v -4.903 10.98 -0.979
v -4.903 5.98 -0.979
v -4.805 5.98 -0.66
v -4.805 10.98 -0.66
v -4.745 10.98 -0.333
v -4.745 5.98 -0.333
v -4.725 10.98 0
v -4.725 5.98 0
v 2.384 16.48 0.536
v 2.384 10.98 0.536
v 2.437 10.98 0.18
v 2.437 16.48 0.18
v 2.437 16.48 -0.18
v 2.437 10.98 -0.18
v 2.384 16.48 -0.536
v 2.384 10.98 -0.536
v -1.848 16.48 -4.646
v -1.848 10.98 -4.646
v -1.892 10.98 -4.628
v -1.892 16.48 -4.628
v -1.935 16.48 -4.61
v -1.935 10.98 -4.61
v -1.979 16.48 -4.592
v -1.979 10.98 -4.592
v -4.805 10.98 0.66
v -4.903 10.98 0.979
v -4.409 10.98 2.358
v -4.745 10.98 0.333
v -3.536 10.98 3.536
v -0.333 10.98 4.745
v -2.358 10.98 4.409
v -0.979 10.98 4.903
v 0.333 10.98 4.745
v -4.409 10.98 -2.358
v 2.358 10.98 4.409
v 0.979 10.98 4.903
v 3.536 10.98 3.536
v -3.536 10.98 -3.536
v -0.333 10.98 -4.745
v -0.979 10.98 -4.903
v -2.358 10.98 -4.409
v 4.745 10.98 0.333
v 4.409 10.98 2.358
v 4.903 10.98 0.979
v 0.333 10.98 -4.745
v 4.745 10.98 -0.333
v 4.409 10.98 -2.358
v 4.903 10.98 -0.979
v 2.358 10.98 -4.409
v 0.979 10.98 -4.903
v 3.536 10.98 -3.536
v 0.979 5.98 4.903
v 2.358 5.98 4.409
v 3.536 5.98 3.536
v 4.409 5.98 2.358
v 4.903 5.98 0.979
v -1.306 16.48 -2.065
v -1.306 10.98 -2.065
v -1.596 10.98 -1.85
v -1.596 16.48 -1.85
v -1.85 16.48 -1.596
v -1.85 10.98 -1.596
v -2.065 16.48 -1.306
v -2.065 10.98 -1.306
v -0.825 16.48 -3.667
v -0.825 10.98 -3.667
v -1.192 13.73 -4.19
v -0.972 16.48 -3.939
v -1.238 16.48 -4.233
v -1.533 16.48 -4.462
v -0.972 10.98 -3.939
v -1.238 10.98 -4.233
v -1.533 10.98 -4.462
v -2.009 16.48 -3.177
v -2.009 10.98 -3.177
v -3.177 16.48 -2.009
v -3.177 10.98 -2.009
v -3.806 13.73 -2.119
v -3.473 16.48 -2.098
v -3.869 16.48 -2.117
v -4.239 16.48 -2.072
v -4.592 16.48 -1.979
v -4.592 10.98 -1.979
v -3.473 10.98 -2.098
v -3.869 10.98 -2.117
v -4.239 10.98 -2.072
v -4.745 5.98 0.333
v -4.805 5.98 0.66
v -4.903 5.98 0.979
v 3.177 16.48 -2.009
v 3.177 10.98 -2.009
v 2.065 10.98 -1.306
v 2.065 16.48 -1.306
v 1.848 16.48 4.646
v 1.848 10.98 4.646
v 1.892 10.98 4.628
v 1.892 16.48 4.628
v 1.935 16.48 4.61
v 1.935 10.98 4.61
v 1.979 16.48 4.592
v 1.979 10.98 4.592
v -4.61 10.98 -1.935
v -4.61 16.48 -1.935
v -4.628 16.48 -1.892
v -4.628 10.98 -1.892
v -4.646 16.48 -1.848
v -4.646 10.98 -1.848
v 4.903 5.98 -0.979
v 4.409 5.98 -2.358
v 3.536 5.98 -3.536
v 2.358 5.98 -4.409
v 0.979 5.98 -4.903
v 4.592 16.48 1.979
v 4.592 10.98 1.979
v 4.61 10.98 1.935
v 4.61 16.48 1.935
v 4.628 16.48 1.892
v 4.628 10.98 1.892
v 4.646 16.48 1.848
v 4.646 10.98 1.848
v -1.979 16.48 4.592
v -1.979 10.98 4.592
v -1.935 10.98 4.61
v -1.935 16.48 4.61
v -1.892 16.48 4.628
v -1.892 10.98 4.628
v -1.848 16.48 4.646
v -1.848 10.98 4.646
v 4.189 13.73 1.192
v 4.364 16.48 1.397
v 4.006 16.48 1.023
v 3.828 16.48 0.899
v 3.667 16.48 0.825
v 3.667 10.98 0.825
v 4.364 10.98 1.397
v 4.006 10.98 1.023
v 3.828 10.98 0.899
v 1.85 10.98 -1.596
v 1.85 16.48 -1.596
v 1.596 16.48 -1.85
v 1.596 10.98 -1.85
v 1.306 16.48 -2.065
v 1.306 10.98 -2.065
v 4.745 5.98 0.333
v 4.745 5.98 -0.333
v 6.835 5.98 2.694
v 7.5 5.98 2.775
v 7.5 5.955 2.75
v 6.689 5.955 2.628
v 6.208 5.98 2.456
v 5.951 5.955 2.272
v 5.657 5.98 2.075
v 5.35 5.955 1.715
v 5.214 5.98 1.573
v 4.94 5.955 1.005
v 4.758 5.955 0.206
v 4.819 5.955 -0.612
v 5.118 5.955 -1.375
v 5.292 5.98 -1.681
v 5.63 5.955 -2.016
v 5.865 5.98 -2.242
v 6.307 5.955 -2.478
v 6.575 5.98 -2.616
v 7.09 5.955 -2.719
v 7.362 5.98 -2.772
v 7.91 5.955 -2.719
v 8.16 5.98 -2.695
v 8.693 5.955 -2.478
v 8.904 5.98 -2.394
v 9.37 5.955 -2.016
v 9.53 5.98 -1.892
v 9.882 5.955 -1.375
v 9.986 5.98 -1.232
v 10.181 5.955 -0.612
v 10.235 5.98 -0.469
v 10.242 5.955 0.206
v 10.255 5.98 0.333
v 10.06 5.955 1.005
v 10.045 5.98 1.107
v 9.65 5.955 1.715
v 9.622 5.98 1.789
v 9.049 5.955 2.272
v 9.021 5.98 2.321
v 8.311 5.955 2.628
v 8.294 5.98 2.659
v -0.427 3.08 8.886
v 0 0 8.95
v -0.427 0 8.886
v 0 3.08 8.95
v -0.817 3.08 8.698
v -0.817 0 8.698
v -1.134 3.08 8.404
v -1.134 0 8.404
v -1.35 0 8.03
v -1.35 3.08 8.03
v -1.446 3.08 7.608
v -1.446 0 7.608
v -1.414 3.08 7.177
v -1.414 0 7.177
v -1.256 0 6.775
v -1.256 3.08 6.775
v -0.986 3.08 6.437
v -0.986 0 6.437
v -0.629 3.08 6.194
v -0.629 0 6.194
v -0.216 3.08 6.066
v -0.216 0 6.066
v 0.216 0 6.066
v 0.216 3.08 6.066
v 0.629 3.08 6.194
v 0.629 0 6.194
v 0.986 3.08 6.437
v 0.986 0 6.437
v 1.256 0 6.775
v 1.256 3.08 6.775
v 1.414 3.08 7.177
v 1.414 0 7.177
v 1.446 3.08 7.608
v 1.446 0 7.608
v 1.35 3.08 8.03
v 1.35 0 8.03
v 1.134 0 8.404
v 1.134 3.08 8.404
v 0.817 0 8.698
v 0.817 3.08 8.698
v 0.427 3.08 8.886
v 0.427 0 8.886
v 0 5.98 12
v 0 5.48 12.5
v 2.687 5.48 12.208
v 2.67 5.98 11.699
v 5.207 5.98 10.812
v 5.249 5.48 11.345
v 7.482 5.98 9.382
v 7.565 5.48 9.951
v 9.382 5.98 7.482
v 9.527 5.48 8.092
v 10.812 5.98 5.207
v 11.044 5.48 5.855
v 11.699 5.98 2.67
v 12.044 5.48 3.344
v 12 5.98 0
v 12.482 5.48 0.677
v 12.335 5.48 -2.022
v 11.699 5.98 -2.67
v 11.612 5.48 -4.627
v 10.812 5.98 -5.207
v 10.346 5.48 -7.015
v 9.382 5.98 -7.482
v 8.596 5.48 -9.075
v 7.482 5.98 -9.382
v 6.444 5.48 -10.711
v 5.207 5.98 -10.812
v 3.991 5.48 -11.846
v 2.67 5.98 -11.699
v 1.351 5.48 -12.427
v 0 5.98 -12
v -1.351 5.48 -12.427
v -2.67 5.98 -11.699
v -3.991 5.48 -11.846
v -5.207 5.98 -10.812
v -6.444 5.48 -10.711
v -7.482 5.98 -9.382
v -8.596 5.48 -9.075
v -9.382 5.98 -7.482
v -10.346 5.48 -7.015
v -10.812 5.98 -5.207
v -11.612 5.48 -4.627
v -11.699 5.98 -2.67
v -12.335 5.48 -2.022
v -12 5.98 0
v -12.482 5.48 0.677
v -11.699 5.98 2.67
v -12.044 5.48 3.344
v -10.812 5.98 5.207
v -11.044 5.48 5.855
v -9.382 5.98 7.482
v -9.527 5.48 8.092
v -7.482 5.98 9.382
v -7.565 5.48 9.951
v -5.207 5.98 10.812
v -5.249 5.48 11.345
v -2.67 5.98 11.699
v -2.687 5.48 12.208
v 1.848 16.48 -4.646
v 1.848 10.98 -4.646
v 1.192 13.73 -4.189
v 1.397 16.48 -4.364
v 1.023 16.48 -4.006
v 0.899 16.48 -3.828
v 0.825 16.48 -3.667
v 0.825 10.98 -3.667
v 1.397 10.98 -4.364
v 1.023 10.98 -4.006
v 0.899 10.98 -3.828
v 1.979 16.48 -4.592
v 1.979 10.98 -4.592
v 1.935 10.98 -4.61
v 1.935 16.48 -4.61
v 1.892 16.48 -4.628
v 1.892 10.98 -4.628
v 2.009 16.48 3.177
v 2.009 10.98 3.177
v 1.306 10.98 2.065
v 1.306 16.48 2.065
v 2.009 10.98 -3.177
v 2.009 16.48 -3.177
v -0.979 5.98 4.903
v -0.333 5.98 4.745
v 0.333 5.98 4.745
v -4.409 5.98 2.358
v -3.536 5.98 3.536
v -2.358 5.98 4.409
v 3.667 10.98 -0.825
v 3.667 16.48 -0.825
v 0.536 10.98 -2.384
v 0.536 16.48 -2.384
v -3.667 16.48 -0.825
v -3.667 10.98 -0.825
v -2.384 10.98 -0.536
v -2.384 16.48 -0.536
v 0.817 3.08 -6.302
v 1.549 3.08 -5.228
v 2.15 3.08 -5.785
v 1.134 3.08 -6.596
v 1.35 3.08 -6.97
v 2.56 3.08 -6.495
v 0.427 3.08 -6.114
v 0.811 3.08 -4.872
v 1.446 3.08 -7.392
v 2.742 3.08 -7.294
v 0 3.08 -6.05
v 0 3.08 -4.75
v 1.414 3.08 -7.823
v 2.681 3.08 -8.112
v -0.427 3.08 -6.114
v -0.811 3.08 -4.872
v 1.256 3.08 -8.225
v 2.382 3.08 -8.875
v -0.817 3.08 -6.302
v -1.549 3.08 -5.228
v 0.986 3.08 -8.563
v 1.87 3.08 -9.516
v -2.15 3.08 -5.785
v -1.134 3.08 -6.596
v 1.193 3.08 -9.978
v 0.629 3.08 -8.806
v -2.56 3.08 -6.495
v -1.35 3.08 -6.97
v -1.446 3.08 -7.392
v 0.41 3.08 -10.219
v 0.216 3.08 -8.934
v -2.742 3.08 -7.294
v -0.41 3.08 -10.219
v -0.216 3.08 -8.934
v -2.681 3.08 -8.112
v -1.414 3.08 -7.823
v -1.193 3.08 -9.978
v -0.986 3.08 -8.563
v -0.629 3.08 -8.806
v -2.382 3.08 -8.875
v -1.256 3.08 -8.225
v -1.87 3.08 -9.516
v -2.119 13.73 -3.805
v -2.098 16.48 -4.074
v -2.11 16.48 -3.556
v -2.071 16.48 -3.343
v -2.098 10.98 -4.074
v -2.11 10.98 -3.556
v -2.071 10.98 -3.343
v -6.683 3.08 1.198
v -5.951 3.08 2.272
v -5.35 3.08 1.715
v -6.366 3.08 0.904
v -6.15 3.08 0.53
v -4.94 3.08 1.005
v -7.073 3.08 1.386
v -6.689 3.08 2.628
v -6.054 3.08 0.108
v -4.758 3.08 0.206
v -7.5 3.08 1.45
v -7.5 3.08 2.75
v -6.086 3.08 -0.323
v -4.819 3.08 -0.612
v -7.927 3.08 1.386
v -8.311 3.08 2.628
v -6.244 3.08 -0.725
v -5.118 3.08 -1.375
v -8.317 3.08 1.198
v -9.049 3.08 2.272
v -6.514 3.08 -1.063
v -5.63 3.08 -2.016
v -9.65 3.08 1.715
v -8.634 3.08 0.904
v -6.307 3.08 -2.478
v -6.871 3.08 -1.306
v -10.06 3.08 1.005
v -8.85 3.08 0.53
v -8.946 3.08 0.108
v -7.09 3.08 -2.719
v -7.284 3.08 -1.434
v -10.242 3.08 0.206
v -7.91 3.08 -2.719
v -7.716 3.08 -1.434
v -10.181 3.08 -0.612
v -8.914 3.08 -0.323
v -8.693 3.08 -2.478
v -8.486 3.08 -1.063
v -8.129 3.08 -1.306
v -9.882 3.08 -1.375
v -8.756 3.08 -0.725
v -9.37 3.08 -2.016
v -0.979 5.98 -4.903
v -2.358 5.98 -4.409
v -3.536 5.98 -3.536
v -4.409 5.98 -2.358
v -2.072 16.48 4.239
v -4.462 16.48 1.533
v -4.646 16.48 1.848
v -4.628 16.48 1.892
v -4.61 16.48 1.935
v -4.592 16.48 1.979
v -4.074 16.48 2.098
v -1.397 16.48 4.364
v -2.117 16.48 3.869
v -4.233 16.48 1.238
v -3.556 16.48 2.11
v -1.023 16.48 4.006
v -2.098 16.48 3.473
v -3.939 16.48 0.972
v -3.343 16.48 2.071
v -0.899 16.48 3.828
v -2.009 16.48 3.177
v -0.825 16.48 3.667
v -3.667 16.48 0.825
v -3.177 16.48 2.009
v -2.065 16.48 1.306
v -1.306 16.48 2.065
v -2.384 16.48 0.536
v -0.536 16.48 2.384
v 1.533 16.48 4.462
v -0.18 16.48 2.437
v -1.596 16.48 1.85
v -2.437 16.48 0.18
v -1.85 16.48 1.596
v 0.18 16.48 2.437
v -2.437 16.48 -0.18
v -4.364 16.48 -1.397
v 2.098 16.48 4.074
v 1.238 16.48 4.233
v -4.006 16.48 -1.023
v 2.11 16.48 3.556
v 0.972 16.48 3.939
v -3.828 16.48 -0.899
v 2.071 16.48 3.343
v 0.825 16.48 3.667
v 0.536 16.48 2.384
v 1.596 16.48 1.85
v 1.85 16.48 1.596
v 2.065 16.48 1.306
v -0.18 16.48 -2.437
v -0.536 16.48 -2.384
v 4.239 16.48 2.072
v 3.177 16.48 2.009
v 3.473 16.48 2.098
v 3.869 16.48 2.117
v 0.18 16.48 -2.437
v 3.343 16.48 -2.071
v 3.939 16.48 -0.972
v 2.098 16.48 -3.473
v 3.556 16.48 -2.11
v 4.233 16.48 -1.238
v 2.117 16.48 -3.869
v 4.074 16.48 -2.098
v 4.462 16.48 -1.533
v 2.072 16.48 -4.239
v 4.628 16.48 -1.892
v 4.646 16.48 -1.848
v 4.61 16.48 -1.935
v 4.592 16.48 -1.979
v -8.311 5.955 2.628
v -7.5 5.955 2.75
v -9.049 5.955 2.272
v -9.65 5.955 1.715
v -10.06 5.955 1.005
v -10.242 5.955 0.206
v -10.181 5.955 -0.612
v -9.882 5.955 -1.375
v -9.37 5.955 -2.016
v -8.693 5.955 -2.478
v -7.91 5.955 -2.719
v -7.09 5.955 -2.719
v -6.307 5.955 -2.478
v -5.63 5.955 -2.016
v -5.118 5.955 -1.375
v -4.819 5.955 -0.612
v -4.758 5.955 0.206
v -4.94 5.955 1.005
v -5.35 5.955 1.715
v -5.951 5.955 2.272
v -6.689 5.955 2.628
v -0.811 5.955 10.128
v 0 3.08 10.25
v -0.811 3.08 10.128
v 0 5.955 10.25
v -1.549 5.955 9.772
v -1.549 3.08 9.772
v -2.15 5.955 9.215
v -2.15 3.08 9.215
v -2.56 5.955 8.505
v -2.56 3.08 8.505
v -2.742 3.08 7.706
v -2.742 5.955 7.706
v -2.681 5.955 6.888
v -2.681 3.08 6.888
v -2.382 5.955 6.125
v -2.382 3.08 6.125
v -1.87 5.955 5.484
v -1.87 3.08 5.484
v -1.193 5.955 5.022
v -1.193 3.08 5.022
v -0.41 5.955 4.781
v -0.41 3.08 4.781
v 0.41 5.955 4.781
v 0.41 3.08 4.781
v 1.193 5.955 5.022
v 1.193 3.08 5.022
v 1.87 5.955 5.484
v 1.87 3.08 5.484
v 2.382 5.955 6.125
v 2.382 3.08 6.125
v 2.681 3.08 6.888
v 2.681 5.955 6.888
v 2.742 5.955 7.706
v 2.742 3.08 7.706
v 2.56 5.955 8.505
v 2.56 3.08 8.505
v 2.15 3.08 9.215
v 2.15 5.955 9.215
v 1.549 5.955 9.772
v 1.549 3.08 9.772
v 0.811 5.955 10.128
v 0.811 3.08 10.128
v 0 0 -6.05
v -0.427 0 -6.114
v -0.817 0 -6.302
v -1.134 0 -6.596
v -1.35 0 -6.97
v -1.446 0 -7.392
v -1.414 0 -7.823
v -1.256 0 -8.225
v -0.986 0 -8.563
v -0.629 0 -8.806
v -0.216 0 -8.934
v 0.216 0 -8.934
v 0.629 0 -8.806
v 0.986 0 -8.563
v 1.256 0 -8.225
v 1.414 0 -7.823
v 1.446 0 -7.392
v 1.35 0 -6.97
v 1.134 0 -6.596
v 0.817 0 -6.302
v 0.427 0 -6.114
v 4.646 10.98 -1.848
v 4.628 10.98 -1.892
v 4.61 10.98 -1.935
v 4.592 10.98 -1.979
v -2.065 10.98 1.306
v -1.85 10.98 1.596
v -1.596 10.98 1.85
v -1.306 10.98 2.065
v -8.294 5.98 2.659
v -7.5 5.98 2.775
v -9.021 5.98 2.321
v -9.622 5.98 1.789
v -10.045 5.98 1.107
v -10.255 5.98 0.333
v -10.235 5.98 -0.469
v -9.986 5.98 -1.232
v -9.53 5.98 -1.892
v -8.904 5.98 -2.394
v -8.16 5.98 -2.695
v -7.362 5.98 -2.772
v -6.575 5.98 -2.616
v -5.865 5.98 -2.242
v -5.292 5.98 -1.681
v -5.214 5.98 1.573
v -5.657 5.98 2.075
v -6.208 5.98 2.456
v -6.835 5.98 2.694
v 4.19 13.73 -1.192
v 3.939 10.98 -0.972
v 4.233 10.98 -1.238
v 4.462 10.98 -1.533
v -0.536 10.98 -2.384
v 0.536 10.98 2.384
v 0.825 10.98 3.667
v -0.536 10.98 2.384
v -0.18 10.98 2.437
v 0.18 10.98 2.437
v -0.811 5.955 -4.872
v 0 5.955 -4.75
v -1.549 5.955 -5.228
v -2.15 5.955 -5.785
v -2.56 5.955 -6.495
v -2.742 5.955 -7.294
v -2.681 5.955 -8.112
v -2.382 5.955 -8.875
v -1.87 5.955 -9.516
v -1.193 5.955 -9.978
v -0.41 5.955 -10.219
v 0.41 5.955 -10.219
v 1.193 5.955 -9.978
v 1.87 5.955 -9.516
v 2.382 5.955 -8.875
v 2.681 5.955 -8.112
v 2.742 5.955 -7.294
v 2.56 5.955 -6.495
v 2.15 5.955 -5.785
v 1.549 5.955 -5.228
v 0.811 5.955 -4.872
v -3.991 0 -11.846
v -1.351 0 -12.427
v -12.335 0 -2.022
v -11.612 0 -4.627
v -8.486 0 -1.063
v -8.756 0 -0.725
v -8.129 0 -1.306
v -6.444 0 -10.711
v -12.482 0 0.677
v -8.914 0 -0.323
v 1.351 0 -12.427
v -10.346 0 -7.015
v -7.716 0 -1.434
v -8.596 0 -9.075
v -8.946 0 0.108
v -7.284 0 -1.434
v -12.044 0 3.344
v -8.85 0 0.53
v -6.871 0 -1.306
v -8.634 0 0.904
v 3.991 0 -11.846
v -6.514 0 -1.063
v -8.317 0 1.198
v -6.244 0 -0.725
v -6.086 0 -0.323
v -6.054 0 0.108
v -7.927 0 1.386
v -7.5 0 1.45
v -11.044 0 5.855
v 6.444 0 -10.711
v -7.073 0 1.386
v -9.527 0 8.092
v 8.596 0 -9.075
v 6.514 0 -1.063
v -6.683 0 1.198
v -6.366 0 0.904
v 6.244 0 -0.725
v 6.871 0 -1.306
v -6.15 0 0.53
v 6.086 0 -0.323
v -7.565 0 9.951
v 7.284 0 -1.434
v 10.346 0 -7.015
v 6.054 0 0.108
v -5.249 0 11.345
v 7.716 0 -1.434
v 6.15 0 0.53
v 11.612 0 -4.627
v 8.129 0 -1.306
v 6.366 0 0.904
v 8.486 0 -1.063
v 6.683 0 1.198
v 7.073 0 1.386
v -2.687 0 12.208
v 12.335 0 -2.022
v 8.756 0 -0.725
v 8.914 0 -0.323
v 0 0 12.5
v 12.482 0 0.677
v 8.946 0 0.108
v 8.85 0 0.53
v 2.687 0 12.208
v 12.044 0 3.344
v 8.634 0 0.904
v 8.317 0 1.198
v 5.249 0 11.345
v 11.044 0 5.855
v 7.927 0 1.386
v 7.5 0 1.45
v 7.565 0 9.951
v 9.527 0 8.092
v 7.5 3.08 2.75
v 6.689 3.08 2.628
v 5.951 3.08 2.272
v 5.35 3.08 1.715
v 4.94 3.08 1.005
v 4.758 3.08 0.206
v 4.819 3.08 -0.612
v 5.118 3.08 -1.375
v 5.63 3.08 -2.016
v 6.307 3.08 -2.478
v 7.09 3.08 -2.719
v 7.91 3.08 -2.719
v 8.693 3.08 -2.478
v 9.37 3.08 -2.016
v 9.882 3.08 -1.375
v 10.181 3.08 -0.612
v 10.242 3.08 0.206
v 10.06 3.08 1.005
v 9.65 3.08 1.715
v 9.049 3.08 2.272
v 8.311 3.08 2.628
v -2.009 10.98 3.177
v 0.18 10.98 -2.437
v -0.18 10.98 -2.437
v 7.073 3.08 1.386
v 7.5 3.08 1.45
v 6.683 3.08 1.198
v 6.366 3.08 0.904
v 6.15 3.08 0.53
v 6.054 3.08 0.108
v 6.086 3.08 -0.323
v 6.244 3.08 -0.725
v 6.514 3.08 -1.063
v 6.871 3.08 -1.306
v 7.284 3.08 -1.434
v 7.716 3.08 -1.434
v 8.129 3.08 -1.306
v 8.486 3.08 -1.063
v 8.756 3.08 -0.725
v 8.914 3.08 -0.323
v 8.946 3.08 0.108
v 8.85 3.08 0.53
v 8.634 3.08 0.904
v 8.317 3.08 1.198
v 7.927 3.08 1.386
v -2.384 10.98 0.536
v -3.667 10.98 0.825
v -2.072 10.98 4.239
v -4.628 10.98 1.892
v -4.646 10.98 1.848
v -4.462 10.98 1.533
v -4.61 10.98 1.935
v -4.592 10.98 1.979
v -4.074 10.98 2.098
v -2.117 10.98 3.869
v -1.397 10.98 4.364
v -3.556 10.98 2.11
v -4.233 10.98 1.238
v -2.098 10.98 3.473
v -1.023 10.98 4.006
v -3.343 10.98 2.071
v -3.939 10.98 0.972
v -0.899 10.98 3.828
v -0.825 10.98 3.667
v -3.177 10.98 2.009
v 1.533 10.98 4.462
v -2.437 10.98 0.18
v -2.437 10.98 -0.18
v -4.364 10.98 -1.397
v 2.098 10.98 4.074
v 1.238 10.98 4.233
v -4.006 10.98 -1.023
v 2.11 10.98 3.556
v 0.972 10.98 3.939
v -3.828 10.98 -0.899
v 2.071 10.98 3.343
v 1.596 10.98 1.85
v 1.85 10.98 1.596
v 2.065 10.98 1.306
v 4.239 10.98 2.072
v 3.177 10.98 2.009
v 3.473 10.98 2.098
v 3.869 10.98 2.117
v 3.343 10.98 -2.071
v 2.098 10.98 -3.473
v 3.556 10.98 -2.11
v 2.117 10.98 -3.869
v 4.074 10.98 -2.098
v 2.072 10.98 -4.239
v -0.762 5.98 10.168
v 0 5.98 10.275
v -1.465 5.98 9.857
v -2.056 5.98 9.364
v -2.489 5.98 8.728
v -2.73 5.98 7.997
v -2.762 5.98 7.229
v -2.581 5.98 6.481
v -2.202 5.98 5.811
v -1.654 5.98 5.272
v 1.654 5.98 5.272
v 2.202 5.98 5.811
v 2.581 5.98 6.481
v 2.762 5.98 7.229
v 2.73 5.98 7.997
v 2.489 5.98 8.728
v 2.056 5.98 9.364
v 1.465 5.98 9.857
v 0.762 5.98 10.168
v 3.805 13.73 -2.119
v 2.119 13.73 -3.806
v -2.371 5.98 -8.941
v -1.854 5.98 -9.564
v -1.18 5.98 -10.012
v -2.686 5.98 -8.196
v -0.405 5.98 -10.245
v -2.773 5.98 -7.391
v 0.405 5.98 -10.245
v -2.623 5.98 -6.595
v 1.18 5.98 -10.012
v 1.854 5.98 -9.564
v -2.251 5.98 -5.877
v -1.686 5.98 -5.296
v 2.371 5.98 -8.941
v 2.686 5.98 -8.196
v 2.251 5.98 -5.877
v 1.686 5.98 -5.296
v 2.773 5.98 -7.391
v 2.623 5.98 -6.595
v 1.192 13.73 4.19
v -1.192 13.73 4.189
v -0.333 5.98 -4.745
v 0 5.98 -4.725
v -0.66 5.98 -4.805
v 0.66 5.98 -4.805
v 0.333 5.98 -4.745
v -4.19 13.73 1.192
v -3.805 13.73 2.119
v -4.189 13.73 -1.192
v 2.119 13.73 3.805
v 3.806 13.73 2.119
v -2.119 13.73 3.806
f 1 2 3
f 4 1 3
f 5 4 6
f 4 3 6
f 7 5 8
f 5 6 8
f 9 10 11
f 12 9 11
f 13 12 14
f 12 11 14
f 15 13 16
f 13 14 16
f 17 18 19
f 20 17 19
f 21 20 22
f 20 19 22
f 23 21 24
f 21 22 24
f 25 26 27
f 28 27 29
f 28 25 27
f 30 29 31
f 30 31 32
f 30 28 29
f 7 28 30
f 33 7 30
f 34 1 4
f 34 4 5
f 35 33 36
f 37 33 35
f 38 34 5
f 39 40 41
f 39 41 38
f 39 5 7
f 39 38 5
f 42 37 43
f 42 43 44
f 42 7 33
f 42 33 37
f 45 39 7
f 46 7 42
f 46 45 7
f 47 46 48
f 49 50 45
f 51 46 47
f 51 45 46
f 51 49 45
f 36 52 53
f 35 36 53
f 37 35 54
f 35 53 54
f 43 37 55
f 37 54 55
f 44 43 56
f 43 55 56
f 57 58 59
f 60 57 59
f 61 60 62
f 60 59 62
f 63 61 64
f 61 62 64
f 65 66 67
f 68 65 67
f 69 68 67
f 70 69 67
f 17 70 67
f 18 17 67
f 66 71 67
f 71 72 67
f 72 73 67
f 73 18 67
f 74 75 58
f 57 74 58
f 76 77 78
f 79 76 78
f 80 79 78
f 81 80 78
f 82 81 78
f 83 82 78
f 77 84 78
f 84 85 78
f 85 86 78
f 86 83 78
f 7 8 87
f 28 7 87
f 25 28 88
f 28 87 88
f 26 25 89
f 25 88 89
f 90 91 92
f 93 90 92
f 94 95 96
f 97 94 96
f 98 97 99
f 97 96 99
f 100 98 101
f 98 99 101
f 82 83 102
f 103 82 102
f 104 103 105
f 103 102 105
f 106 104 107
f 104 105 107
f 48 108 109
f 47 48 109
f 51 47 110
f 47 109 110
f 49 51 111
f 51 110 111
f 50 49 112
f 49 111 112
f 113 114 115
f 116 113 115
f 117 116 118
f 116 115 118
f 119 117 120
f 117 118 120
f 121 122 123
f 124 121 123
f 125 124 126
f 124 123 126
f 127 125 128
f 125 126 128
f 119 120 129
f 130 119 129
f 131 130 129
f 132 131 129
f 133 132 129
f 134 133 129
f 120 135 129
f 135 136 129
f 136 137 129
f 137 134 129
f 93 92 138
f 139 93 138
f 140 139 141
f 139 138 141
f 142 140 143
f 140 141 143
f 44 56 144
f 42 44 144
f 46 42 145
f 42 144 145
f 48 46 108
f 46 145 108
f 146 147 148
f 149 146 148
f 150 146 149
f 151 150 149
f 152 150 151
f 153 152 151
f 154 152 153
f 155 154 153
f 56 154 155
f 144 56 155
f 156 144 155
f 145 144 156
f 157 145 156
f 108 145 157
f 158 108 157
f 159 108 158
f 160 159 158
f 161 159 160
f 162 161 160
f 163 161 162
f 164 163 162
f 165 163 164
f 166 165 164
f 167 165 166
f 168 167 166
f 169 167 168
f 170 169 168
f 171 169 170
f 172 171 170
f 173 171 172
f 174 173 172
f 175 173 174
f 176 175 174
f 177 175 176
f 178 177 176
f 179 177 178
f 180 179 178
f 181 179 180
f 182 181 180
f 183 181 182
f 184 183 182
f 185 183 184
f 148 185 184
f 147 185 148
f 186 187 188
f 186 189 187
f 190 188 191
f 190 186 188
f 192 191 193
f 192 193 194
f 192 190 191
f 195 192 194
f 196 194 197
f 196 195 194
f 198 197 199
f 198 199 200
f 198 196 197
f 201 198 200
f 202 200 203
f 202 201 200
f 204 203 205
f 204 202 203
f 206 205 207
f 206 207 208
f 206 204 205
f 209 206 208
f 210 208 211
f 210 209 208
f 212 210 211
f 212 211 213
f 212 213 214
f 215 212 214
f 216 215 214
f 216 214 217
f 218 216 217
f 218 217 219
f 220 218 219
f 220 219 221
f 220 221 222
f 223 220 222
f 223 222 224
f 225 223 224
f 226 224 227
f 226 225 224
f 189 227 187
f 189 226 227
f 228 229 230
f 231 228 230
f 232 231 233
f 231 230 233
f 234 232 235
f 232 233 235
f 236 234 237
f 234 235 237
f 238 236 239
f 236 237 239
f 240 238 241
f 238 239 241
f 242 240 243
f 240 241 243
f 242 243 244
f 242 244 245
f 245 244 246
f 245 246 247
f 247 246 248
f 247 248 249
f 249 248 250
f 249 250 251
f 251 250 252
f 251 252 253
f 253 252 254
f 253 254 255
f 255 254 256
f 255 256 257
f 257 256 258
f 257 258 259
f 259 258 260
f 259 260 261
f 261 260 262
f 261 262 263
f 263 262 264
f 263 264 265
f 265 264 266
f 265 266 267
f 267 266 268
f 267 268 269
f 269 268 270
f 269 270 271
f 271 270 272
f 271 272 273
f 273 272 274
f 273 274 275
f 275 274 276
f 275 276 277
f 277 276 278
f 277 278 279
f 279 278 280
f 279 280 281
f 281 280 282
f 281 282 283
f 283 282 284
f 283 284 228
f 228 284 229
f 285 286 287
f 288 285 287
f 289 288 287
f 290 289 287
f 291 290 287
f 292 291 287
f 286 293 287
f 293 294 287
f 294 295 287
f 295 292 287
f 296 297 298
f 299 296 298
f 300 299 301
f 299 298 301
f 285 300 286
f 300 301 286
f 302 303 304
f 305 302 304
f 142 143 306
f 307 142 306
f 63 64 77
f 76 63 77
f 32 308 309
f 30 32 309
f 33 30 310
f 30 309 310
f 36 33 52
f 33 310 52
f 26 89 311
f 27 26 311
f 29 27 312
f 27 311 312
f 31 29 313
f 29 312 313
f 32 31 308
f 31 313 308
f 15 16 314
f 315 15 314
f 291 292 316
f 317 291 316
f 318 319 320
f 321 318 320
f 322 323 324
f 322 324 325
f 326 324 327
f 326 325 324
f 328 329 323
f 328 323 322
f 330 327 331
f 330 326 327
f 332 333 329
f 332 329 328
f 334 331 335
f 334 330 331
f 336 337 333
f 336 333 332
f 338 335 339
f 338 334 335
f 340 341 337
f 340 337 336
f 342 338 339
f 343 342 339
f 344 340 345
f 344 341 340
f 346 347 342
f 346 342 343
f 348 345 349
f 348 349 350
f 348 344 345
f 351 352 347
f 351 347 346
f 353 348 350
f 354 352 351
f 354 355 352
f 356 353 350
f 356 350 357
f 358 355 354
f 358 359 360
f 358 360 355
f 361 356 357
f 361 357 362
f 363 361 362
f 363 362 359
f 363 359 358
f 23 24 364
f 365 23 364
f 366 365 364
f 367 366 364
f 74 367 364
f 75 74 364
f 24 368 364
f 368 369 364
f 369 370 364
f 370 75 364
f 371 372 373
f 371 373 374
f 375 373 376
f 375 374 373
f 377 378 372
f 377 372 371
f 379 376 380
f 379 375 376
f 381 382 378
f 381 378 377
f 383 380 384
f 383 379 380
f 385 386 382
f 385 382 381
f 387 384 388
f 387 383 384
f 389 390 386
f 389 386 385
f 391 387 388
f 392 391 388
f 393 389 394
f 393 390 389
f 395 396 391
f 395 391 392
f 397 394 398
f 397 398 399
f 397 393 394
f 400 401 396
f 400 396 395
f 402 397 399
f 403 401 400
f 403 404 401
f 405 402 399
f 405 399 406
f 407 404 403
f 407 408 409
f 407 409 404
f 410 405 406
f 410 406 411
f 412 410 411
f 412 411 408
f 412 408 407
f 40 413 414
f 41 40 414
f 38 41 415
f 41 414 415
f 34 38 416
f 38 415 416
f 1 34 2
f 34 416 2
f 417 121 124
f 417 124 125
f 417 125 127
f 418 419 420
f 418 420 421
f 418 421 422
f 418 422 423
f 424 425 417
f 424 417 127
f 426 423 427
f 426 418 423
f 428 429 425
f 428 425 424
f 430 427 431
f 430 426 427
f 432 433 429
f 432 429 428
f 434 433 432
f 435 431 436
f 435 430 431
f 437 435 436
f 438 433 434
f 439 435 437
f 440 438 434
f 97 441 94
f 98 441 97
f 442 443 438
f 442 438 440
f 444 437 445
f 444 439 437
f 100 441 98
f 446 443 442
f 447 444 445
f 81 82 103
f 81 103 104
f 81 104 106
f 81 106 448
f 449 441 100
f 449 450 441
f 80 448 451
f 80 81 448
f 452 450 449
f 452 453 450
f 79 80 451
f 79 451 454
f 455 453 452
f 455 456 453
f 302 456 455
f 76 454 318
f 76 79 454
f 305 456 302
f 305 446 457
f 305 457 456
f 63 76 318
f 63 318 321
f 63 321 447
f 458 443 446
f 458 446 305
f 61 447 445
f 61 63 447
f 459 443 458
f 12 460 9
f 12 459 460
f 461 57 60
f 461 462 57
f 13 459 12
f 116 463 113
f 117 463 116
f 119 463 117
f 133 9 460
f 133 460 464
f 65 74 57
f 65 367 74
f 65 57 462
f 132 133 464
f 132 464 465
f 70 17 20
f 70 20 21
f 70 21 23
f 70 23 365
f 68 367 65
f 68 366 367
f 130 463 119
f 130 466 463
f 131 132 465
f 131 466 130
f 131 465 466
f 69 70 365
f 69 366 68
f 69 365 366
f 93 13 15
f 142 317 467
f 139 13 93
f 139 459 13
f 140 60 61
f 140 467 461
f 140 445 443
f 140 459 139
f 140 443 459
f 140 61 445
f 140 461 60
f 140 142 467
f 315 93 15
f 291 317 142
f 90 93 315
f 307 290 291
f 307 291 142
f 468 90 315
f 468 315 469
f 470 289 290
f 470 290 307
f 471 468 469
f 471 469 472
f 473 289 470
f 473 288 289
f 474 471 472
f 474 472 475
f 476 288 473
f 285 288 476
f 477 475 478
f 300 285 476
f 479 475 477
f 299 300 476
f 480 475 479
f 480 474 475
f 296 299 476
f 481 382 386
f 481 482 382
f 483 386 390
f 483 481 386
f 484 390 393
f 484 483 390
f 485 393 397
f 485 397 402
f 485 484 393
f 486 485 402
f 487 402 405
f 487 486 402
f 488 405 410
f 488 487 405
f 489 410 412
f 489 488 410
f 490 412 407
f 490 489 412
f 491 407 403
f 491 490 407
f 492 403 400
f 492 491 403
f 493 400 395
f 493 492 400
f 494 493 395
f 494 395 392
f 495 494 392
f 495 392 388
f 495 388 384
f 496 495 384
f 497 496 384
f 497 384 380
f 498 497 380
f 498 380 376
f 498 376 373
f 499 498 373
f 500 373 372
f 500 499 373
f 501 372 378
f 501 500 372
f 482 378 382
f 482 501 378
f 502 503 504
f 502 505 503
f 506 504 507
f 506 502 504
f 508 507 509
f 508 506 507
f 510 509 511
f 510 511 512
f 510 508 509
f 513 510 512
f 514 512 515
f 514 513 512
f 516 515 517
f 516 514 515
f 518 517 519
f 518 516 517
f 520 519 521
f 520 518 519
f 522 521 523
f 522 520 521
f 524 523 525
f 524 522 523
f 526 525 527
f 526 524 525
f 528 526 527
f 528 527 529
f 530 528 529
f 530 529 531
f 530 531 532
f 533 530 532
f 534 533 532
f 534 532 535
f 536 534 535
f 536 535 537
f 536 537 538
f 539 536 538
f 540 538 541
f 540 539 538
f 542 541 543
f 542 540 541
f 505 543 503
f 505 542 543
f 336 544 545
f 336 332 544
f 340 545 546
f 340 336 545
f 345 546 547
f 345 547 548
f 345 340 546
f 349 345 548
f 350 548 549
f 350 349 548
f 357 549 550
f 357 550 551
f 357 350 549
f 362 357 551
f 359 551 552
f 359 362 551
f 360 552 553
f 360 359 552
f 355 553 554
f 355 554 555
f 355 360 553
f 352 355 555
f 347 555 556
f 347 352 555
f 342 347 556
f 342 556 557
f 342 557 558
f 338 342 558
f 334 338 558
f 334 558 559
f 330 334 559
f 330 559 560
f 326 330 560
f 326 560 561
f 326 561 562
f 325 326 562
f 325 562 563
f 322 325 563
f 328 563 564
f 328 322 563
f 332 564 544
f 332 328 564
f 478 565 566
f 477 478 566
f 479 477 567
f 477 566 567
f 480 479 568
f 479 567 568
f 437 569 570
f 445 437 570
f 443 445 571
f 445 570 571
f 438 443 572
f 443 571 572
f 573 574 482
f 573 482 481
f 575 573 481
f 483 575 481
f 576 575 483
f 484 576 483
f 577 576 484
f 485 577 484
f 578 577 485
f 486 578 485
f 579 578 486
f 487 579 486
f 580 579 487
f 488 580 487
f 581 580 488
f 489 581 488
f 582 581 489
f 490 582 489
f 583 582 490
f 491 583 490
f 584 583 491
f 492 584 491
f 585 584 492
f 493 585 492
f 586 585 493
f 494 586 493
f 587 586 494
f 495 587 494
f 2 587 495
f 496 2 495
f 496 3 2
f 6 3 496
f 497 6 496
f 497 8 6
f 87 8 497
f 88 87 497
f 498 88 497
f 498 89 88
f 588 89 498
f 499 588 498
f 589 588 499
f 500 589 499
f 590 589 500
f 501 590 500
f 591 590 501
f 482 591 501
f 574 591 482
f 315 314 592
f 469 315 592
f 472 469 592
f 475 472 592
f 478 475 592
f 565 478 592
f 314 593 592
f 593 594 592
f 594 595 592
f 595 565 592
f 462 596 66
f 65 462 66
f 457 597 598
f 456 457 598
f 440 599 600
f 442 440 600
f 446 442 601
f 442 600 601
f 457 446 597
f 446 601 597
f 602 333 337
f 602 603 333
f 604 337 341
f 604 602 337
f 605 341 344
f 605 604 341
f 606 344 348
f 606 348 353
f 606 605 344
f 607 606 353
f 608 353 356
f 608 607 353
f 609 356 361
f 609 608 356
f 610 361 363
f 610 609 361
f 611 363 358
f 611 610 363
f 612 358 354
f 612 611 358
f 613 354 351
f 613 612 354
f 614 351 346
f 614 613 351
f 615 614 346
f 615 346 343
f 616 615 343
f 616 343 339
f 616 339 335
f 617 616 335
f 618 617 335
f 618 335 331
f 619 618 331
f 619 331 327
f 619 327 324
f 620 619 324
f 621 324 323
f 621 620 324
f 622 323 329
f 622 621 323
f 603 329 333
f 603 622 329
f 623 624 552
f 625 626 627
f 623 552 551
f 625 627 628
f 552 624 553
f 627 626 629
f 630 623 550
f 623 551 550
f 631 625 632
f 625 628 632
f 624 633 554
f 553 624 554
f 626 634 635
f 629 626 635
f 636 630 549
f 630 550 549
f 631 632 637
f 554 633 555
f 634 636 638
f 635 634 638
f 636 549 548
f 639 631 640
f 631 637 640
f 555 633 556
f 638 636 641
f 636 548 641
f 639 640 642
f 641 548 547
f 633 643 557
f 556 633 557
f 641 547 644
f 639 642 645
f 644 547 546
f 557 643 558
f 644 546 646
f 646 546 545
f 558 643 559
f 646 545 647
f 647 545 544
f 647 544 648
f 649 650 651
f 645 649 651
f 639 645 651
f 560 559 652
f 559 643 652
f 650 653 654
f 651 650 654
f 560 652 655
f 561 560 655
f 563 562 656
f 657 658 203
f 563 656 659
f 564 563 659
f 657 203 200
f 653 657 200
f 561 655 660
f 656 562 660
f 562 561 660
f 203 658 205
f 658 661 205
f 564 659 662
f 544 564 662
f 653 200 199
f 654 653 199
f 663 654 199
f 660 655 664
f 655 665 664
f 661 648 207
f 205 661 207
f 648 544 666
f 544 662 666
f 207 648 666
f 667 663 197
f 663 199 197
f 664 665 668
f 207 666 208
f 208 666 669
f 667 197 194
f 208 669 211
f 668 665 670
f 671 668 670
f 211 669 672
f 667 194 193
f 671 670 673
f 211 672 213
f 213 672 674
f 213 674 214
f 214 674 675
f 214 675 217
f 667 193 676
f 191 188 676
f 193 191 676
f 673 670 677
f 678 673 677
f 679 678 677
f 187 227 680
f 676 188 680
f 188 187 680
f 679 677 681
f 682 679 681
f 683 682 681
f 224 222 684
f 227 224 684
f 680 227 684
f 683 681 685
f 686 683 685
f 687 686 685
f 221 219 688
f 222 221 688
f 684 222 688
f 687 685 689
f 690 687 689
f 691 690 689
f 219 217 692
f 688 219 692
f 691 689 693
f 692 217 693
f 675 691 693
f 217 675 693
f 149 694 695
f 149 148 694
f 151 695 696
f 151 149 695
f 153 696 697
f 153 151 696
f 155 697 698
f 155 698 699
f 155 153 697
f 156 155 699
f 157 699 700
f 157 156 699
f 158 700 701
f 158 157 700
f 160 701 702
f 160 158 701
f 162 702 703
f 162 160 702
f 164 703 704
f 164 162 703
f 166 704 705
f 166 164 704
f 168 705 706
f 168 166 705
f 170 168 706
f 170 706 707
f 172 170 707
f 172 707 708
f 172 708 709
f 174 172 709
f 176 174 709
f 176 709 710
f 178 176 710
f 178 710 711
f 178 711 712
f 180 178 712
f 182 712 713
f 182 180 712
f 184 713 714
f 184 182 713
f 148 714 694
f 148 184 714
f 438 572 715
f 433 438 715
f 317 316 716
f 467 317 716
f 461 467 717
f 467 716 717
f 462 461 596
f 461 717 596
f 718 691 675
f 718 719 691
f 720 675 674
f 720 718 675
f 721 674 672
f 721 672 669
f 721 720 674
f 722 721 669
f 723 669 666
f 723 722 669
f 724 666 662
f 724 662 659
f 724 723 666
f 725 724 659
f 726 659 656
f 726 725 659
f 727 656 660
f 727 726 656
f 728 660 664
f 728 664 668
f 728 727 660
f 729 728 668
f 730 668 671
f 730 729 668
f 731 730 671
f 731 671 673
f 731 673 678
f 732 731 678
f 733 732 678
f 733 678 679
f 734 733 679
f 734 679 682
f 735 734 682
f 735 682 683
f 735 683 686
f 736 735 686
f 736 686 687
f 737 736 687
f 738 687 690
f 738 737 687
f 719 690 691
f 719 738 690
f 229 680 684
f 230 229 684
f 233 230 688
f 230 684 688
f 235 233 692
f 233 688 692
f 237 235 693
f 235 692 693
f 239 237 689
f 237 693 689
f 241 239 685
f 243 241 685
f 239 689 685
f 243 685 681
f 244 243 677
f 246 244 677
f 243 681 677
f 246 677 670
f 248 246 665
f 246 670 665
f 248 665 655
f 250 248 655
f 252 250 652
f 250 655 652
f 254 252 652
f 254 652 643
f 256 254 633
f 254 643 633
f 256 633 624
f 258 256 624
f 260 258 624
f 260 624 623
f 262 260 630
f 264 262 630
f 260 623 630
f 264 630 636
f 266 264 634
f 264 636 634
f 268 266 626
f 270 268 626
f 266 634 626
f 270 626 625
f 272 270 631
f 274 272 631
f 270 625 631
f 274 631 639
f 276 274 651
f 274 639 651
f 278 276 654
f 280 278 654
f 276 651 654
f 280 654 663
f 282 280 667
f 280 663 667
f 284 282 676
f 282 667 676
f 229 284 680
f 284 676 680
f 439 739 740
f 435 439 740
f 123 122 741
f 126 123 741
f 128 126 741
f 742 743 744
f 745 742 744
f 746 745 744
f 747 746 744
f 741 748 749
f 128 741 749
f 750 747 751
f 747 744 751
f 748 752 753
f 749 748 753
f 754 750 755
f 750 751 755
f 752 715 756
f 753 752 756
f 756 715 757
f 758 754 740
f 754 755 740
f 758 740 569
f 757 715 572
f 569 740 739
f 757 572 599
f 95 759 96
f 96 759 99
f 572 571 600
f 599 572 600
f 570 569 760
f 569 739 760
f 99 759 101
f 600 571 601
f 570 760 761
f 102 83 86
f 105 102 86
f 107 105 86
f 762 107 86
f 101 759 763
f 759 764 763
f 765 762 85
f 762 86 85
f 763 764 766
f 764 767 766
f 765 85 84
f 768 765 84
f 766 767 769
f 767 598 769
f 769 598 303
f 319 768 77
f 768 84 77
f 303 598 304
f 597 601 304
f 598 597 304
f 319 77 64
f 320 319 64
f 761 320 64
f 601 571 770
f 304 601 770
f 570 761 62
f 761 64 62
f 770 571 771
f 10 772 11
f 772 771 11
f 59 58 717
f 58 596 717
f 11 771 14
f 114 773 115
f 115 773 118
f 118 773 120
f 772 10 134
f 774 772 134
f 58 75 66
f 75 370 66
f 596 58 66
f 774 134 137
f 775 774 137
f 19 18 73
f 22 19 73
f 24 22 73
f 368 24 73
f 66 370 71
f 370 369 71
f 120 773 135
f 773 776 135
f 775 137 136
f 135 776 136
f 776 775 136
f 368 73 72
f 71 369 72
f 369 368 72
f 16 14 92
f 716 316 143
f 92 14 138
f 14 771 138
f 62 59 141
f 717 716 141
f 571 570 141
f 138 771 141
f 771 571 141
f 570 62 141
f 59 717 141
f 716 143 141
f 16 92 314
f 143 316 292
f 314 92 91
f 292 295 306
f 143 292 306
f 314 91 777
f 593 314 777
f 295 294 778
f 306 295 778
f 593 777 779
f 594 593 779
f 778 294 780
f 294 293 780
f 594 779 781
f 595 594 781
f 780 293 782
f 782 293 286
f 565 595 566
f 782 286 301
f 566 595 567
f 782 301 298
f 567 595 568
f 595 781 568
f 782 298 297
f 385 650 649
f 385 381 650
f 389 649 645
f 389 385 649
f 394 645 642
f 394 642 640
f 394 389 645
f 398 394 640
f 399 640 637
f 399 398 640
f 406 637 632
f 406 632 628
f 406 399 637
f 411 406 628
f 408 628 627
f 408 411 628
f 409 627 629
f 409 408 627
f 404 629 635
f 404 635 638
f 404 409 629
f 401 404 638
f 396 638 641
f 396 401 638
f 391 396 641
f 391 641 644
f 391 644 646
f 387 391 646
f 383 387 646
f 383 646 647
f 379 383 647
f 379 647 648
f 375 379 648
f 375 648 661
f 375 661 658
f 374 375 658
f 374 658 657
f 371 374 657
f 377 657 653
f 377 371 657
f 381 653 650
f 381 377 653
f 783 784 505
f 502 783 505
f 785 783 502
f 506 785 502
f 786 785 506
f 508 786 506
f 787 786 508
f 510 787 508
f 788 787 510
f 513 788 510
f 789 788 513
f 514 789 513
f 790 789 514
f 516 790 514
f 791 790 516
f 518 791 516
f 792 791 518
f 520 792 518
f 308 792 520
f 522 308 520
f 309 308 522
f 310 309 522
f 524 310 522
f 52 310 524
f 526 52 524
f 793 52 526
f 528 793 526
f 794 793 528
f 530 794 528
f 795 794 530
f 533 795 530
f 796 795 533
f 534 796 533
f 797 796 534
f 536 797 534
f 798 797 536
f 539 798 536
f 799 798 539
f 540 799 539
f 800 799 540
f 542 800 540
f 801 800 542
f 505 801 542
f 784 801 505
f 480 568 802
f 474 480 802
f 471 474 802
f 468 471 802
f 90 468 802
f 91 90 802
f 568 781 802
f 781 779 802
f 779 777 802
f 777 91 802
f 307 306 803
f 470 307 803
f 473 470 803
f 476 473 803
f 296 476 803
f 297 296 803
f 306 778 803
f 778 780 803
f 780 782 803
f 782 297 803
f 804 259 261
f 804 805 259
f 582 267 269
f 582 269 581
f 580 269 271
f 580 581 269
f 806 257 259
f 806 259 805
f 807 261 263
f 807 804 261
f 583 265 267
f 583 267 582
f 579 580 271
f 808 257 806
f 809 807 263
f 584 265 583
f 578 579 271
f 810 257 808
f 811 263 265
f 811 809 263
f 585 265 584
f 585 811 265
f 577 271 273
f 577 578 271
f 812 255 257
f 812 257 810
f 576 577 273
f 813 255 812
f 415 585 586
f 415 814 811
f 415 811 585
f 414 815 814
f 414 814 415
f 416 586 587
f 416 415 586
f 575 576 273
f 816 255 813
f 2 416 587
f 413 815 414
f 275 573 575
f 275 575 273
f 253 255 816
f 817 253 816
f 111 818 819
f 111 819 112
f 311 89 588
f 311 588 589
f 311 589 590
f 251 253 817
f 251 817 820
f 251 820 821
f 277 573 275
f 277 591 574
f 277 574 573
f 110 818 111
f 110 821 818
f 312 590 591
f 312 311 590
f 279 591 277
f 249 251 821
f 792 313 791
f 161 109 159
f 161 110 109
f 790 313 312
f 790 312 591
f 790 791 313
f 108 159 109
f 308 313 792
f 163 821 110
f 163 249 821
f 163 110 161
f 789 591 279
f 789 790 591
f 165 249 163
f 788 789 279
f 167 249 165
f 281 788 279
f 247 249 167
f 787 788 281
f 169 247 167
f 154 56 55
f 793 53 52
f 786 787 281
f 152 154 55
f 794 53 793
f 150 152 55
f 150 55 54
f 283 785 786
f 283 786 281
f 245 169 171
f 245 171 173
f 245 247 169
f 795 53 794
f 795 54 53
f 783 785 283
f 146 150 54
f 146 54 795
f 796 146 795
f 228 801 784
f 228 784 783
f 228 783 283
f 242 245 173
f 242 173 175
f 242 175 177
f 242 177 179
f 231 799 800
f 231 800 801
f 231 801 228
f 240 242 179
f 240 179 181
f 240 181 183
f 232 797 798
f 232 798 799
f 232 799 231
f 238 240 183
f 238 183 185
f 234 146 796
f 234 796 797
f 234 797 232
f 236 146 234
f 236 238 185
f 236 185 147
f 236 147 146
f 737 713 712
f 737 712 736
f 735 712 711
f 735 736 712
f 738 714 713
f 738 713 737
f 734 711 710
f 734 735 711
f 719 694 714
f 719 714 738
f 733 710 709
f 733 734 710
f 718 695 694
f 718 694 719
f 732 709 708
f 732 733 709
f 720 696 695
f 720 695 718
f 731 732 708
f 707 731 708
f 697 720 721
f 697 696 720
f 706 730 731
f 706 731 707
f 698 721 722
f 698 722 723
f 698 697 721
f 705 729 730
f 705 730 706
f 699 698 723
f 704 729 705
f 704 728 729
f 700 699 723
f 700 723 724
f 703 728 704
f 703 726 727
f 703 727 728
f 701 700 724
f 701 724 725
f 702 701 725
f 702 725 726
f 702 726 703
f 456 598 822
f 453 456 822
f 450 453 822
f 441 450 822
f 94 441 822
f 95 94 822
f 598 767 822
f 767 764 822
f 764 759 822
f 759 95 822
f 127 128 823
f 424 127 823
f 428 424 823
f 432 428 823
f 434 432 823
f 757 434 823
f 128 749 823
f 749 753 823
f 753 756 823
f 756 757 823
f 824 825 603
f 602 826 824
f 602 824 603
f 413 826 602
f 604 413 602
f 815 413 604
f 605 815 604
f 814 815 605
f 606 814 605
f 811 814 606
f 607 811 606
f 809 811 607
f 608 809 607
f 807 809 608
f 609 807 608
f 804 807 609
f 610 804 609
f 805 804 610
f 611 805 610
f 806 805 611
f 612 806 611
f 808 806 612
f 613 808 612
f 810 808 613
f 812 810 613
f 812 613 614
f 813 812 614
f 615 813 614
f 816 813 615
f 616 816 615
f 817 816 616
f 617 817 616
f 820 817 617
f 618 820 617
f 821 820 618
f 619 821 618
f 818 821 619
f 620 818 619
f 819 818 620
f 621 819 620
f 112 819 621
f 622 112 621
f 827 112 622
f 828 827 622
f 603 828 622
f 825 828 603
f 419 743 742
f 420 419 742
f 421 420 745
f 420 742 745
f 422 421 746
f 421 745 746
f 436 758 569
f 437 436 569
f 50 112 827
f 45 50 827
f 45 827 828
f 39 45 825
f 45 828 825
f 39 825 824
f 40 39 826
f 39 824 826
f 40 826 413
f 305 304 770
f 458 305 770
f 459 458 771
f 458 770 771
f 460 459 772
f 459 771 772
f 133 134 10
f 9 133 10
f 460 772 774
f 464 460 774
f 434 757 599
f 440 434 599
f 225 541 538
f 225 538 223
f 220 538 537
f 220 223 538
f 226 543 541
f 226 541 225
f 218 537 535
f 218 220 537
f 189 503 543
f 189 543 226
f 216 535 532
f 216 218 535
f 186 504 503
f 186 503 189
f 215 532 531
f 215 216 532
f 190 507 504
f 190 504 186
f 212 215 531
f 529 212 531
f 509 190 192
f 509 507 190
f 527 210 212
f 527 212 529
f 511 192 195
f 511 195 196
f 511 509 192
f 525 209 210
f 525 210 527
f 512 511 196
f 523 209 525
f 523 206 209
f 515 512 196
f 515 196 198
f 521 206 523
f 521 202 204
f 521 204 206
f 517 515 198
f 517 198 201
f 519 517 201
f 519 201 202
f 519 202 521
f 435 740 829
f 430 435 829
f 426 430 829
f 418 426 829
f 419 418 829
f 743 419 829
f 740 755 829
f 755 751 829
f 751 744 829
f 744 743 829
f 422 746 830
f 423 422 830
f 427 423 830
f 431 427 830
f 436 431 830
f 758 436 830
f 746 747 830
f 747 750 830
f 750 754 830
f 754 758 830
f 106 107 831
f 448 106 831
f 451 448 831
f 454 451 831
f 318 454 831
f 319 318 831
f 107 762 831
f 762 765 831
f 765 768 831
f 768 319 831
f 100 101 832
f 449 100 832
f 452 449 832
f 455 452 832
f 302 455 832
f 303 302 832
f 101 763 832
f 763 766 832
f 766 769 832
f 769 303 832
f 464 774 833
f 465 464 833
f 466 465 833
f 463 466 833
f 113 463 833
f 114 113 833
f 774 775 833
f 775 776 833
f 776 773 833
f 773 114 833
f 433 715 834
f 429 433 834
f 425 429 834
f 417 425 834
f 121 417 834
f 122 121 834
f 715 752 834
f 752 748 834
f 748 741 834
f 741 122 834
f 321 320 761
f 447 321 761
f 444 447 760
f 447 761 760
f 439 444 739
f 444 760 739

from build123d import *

# Parameters (mm, degrees)
SKETCH1_R                                    = 12.5
BOSS_EXTRUDE1_DEPTH                          = 5.98
CBORE_FOR_M2_5_HEX_SOCKET_HEAD_CAP_S_2_COUNT = 2
CBORE_FOR_M2_5_HEX_SOCKET_HEAD_CAP_S_2_PITCH = 10.606601718
CBORE_FOR_M2_5_HEX_SOCKET_HEAD_CAP_S_3_COUNT = 2
CBORE_FOR_M2_5_HEX_SOCKET_HEAD_CAP_S_3_PITCH = 15
CBORE_FOR_M2_5_HEX_SOCKET_HEAD_CAP_S_4_COUNT = 2
CBORE_FOR_M2_5_HEX_SOCKET_HEAD_CAP_S_4_PITCH = 10.606601718
BOSS_EXTRUDE2_DEPTH                          = 5
BOSS_EXTRUDE3_DEPTH                          = 5.5
F_0_5MM_CHAMFER_SIZE                         = 0.5


with BuildPart() as part:
    # Sketch1 → Boss-Extrude1 (new body)
    with BuildSketch(Plane(origin=(0, 0, 0), x_dir=(1, 0, 0), z_dir=(0, 1, 0))):
        with Locations(Location((0, 0, 0), (0, 0, 270))):
            Circle(SKETCH1_R)
    extrude(amount=BOSS_EXTRUDE1_DEPTH)

    # Sketch3 → CBORE for M2.5 Hex Socket Head Cap Screw1 (revolve, cut)
    with BuildSketch(Plane(origin=(-7.5, 5.98, 0), x_dir=(0, 0, 1), z_dir=(1, 0, 0))):
        Polygon((0, 0), (0, 5.98), (1.45, 5.98), (1.45, 2.9), (2.75, 2.9), (2.75, 0.025), (2.775, 0), align=None)
    cbore_for_m2_5_hex_socket_head_cap_screw = revolve(axis=Axis((-7.5, 12.33, 0), (0, -1, 0)), mode=Mode.SUBTRACT)

    # CBORE for M2.5 Hex Socket Head Cap S 2: CBORE for M2.5 Hex Socket Head Cap Screw1 ×2
    with Locations(*[Vector(0.7071067811865476, 0, -0.7071067811865476) * (i * CBORE_FOR_M2_5_HEX_SOCKET_HEAD_CAP_S_2_PITCH) for i in range(1, CBORE_FOR_M2_5_HEX_SOCKET_HEAD_CAP_S_2_COUNT)]):
        add(cbore_for_m2_5_hex_socket_head_cap_screw, mode=Mode.SUBTRACT)

    # CBORE for M2.5 Hex Socket Head Cap S 3: CBORE for M2.5 Hex Socket Head Cap Screw1 ×2
    with Locations(*[(i * CBORE_FOR_M2_5_HEX_SOCKET_HEAD_CAP_S_3_PITCH, 0, 0) for i in range(1, CBORE_FOR_M2_5_HEX_SOCKET_HEAD_CAP_S_3_COUNT)]):
        add(cbore_for_m2_5_hex_socket_head_cap_screw, mode=Mode.SUBTRACT)

    # CBORE for M2.5 Hex Socket Head Cap S 4: CBORE for M2.5 Hex Socket Head Cap Screw1 ×2
    with Locations(*[Vector(0.7071067811865476, 0, 0.7071067811865476) * (i * CBORE_FOR_M2_5_HEX_SOCKET_HEAD_CAP_S_4_PITCH) for i in range(1, CBORE_FOR_M2_5_HEX_SOCKET_HEAD_CAP_S_4_COUNT)]):
        add(cbore_for_m2_5_hex_socket_head_cap_screw, mode=Mode.SUBTRACT)

    # Sketch5 → Boss-Extrude2 (add)
    with BuildSketch(Plane(origin=(0, 5.98, 0), x_dir=(1, 0, 0), z_dir=(0, 1, 0))):
        with BuildLine():
            ThreePointArc((4.903291667, -0.978637232), (4.725, 0), (4.903291667, 0.978637232))
            ThreePointArc((4.903291667, 0.978637232), (3.535533906, 3.535533906), (0.978637232, 4.903291667))
            ThreePointArc((0.978637232, 4.903291667), (0, 4.725), (-0.978637232, 4.903291667))
            ThreePointArc((-0.978637232, 4.903291667), (-3.535533906, 3.535533906), (-4.903291667, 0.978637232))
            ThreePointArc((-4.903291667, 0.978637232), (-4.769936757, 0.497372785), (-4.725, 0))
            ThreePointArc((-4.725, 0), (-4.769936757, -0.497372785), (-4.903291667, -0.978637232))
            ThreePointArc((-4.903291667, -0.978637232), (-3.535533906, -3.535533906), (-0.978637232, -4.903291667))
            ThreePointArc((-0.978637232, -4.903291667), (0, -4.725), (0.978637232, -4.903291667))
            ThreePointArc((0.978637232, -4.903291667), (3.535533906, -3.535533906), (4.903291667, -0.978637232))
        make_face()
    extrude(amount=BOSS_EXTRUDE2_DEPTH)

    # 0,5mm Chamfer
    f_0_5mm_chamfer_edges = [part.edges().sort_by_distance(p)[0] for p in [
        (0, 5.98, -12.5),
    ]]
    chamfer(f_0_5mm_chamfer_edges, length=F_0_5MM_CHAMFER_SIZE)


with BuildPart() as body_2:
    # Sketch4 → Boss-Extrude3 (new body)
    with BuildSketch(Plane(origin=(0, 10.98, 0), x_dir=(1, 0, 0), z_dir=(0, 1, 0))):
        with BuildLine():
            Line((-2.009476748, 3.176532504), (-1.306159886, 2.064746127))
            ThreePointArc((-1.306159886, 2.064746127), (-1.727603863, 1.727603863), (-2.064746127, 1.306159886))
            Line((-2.064746127, 1.306159886), (-3.176532504, 2.009476748))
            add(Edge.make_bspline(
                [(-3.176532504, 2.009476748), (-3.709693798, 2.27301123), (-4.591724504, 1.978905274)],
                knots=[0.50407462, 0.50407462, 0.50407462, 1.738238777, 1.738238777, 1.738238777], degree=2, weights=[1, 0.815570405, 1]))
            ThreePointArc((-4.591724504, 1.978905274), (-4.619397663, 1.913417162), (-4.646136872, 1.847542195))
            add(Edge.make_bspline(
                [(-4.646136872, 1.847542195), (-4.230177813, 1.011711238), (-3.667062309, 0.825233039)],
                knots=[4.493136736, 4.493136736, 4.493136736, 5.781201385, 5.781201385, 5.781201385], degree=2, weights=[1, 0.799681158, 1]))
            Line((-3.667062309, 0.825233039), (-2.383590501, 0.536401475))
            ThreePointArc((-2.383590501, 0.536401475), (-2.443200814, 0), (-2.383590501, -0.536401475))
            Line((-2.383590501, -0.536401475), (-3.667062309, -0.825233039))
            add(Edge.make_bspline(
                [(-3.667062309, -0.825233039), (-4.230411296, -1.015887986), (-4.646136872, -1.847542195)],
                knots=[0.50407462, 0.50407462, 0.50407462, 1.738238777, 1.738238777, 1.738238777], degree=2, weights=[1, 0.815570405, 1]))
            ThreePointArc((-4.646136872, -1.847542195), (-4.619397663, -1.913417162), (-4.591724504, -1.978905274))
            add(Edge.make_bspline(
                [(-4.591724504, -1.978905274), (-3.706575294, -2.27579954), (-3.176532504, -2.009476748)],
                knots=[4.493136736, 4.493136736, 4.493136736, 5.781201385, 5.781201385, 5.781201385], degree=2, weights=[1, 0.799681158, 1]))
            Line((-3.176532504, -2.009476748), (-2.064746127, -1.306159886))
            ThreePointArc((-2.064746127, -1.306159886), (-1.727603863, -1.727603863), (-1.306159886, -2.064746127))
            Line((-1.306159886, -2.064746127), (-2.009476748, -3.176532504))
            add(Edge.make_bspline(
                [(-2.009476748, -3.176532504), (-2.27301123, -3.709693798), (-1.978905274, -4.591724504)],
                knots=[3.645667274, 3.645667274, 3.645667274, 4.87983143, 4.87983143, 4.87983143], degree=2, weights=[1, 0.815570405, 1]))
            ThreePointArc((-1.978905274, -4.591724504), (-1.913417162, -4.619397663), (-1.847542195, -4.646136872))
            add(Edge.make_bspline(
                [(-1.847542195, -4.646136872), (-1.011711238, -4.230177813), (-0.825233039, -3.667062309)],
                knots=[4.493136736, 4.493136736, 4.493136736, 5.781201385, 5.781201385, 5.781201385], degree=2, weights=[1, 0.799681158, 1]))
            Line((-0.825233039, -3.667062309), (-0.536401475, -2.383590501))
            ThreePointArc((-0.536401475, -2.383590501), (0, -2.443200814), (0.536401475, -2.383590501))
            Line((0.536401475, -2.383590501), (0.825233039, -3.667062309))
            add(Edge.make_bspline(
                [(0.825233039, -3.667062309), (1.015887986, -4.230411296), (1.847542195, -4.646136872)],
                knots=[3.645667274, 3.645667274, 3.645667274, 4.87983143, 4.87983143, 4.87983143], degree=2, weights=[1, 0.815570405, 1]))
            ThreePointArc((1.847542195, -4.646136872), (1.913417162, -4.619397663), (1.978905274, -4.591724504))
            add(Edge.make_bspline(
                [(1.978905274, -4.591724504), (2.27579954, -3.706575294), (2.009476748, -3.176532504)],
                knots=[4.493136736, 4.493136736, 4.493136736, 5.781201385, 5.781201385, 5.781201385], degree=2, weights=[1, 0.799681158, 1]))
            Line((2.009476748, -3.176532504), (1.306159886, -2.064746127))
            ThreePointArc((1.306159886, -2.064746127), (1.727603863, -1.727603863), (2.064746127, -1.306159886))
            Line((2.064746127, -1.306159886), (3.176532504, -2.009476748))
            add(Edge.make_bspline(
                [(3.176532504, -2.009476748), (3.709693798, -2.27301123), (4.591724504, -1.978905274)],
                knots=[0.50407462, 0.50407462, 0.50407462, 1.738238777, 1.738238777, 1.738238777], degree=2, weights=[1, 0.815570405, 1]))
            ThreePointArc((4.591724504, -1.978905274), (4.619397663, -1.913417162), (4.646136872, -1.847542195))
            add(Edge.make_bspline(
                [(4.646136872, -1.847542195), (4.230177813, -1.011711238), (3.667062309, -0.825233039)],
                knots=[4.493136736, 4.493136736, 4.493136736, 5.781201385, 5.781201385, 5.781201385], degree=2, weights=[1, 0.799681158, 1]))
            Line((3.667062309, -0.825233039), (2.383590501, -0.536401475))
            ThreePointArc((2.383590501, -0.536401475), (2.443200814, 0), (2.383590501, 0.536401475))
            Line((2.383590501, 0.536401475), (3.667062309, 0.825233039))
            add(Edge.make_bspline(
                [(3.667062309, 0.825233039), (4.230411296, 1.015887986), (4.646136872, 1.847542195)],
                knots=[0.50407462, 0.50407462, 0.50407462, 1.738238777, 1.738238777, 1.738238777], degree=2, weights=[1, 0.815570405, 1]))
            ThreePointArc((4.646136872, 1.847542195), (4.619397663, 1.913417162), (4.591724504, 1.978905274))
            add(Edge.make_bspline(
                [(4.591724504, 1.978905274), (3.706575294, 2.27579954), (3.176532504, 2.009476748)],
                knots=[1.351544083, 1.351544083, 1.351544083, 2.639608731, 2.639608731, 2.639608731], degree=2, weights=[1, 0.799681158, 1]))
            Line((3.176532504, 2.009476748), (2.064746127, 1.306159886))
            ThreePointArc((2.064746127, 1.306159886), (1.727603863, 1.727603863), (1.306159886, 2.064746127))
            Line((1.306159886, 2.064746127), (2.009476748, 3.176532504))
            add(Edge.make_bspline(
                [(2.009476748, 3.176532504), (2.27301123, 3.709693798), (1.978905274, 4.591724504)],
                knots=[0.50407462, 0.50407462, 0.50407462, 1.738238777, 1.738238777, 1.738238777], degree=2, weights=[1, 0.815570405, 1]))
            ThreePointArc((1.978905274, 4.591724504), (1.913417162, 4.619397663), (1.847542195, 4.646136872))
            add(Edge.make_bspline(
                [(1.847542195, 4.646136872), (1.011711238, 4.230177813), (0.825233039, 3.667062309)],
                knots=[1.351544083, 1.351544083, 1.351544083, 2.639608731, 2.639608731, 2.639608731], degree=2, weights=[1, 0.799681158, 1]))
            Line((0.825233039, 3.667062309), (0.536401475, 2.383590501))
            ThreePointArc((0.536401475, 2.383590501), (0, 2.443200814), (-0.536401475, 2.383590501))
            Line((-0.536401475, 2.383590501), (-0.825233039, 3.667062309))
            add(Edge.make_bspline(
                [(-0.825233039, 3.667062309), (-1.015887986, 4.230411296), (-1.847542195, 4.646136872)],
                knots=[0.50407462, 0.50407462, 0.50407462, 1.738238777, 1.738238777, 1.738238777], degree=2, weights=[1, 0.815570405, 1]))
            ThreePointArc((-1.847542195, 4.646136872), (-1.913417162, 4.619397663), (-1.978905274, 4.591724504))
            add(Edge.make_bspline(
                [(-1.978905274, 4.591724504), (-2.27579954, 3.706575294), (-2.009476748, 3.176532504)],
                knots=[1.351544083, 1.351544083, 1.351544083, 2.639608731, 2.639608731, 2.639608731], degree=2, weights=[1, 0.799681158, 1]))
        make_face()
    extrude(amount=BOSS_EXTRUDE3_DEPTH)


solid = Compound([part.part, body_2.part])
